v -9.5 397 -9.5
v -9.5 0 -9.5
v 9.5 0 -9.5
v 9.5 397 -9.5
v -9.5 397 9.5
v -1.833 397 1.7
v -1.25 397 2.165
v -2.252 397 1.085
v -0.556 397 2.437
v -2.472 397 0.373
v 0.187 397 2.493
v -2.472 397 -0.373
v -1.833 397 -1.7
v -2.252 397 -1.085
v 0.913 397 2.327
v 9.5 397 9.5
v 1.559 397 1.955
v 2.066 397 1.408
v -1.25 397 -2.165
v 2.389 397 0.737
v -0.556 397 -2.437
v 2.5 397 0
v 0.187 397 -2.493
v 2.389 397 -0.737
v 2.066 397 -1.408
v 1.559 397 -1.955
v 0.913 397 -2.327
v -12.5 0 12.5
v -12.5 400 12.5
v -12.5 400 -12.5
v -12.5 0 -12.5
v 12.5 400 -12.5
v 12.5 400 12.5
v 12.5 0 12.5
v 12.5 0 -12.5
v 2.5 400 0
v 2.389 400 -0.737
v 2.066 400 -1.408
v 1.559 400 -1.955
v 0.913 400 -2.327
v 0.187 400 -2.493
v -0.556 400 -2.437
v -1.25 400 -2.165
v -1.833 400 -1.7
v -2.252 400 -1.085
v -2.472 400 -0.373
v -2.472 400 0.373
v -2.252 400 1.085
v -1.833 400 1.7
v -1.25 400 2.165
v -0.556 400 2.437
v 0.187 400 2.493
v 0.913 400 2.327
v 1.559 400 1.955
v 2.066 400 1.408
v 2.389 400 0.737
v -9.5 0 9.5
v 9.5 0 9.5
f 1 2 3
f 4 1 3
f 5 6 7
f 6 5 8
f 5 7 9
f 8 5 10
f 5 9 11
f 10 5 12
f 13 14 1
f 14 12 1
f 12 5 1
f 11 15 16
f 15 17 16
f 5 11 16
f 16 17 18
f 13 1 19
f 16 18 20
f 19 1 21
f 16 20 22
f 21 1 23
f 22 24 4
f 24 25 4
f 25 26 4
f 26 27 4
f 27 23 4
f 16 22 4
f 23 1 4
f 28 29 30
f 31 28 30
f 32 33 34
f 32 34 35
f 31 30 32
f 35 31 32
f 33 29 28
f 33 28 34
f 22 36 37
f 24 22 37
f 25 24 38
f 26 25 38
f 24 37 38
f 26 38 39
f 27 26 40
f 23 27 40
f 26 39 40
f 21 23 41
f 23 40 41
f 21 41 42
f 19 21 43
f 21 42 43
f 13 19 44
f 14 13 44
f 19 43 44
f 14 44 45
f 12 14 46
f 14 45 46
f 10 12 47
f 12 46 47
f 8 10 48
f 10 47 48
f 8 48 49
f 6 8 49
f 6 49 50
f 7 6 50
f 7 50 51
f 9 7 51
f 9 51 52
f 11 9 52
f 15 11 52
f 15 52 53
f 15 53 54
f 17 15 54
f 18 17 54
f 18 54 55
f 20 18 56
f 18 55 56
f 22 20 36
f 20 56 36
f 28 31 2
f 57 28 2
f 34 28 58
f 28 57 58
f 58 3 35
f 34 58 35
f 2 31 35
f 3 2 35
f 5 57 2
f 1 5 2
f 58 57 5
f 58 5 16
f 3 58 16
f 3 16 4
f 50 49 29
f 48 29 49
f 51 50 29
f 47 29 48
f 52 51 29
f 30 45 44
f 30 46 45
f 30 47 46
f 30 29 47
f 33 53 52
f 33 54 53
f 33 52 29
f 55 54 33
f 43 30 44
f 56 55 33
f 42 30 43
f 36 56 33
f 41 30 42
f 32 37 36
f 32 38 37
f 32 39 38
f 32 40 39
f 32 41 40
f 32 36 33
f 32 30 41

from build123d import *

# Parameters (mm, degrees)
SKETCH1_W           = 25
SKETCH1_H           = 25
BOSS_EXTRUDE1_DEPTH = 400
SHELL1_T            = -3
SKETCH2_W           = 19
SKETCH2_H           = 19
SKETCH2_R           = 2.5
BOSS_EXTRUDE2_DEPTH = 3


with BuildPart() as part:
    # Sketch1 → Boss-Extrude1 (new body)
    with BuildSketch(Plane(origin=(0, 0, 0), x_dir=(1, 0, 0), z_dir=(0, 1, 0))):
        Rectangle(SKETCH1_W, SKETCH1_H)
    extrude(amount=BOSS_EXTRUDE1_DEPTH)

    # Shell1
    shell1_openings = [part.faces().sort_by_distance(p)[0] for p in [
        (0, 400, 0),
        (0, 0, 0),
    ]]
    offset(amount=SHELL1_T, openings=shell1_openings, kind=Kind.INTERSECTION)

    # Sketch2 → Boss-Extrude2 (add)
    with BuildSketch(Plane(origin=(0, 400, 0), x_dir=(1, 0, 0), z_dir=(0, 1, 0))):
        Rectangle(SKETCH2_W, SKETCH2_H)
        Circle(SKETCH2_R, mode=Mode.SUBTRACT)
    extrude(amount=-BOSS_EXTRUDE2_DEPTH)


solid = part.part
